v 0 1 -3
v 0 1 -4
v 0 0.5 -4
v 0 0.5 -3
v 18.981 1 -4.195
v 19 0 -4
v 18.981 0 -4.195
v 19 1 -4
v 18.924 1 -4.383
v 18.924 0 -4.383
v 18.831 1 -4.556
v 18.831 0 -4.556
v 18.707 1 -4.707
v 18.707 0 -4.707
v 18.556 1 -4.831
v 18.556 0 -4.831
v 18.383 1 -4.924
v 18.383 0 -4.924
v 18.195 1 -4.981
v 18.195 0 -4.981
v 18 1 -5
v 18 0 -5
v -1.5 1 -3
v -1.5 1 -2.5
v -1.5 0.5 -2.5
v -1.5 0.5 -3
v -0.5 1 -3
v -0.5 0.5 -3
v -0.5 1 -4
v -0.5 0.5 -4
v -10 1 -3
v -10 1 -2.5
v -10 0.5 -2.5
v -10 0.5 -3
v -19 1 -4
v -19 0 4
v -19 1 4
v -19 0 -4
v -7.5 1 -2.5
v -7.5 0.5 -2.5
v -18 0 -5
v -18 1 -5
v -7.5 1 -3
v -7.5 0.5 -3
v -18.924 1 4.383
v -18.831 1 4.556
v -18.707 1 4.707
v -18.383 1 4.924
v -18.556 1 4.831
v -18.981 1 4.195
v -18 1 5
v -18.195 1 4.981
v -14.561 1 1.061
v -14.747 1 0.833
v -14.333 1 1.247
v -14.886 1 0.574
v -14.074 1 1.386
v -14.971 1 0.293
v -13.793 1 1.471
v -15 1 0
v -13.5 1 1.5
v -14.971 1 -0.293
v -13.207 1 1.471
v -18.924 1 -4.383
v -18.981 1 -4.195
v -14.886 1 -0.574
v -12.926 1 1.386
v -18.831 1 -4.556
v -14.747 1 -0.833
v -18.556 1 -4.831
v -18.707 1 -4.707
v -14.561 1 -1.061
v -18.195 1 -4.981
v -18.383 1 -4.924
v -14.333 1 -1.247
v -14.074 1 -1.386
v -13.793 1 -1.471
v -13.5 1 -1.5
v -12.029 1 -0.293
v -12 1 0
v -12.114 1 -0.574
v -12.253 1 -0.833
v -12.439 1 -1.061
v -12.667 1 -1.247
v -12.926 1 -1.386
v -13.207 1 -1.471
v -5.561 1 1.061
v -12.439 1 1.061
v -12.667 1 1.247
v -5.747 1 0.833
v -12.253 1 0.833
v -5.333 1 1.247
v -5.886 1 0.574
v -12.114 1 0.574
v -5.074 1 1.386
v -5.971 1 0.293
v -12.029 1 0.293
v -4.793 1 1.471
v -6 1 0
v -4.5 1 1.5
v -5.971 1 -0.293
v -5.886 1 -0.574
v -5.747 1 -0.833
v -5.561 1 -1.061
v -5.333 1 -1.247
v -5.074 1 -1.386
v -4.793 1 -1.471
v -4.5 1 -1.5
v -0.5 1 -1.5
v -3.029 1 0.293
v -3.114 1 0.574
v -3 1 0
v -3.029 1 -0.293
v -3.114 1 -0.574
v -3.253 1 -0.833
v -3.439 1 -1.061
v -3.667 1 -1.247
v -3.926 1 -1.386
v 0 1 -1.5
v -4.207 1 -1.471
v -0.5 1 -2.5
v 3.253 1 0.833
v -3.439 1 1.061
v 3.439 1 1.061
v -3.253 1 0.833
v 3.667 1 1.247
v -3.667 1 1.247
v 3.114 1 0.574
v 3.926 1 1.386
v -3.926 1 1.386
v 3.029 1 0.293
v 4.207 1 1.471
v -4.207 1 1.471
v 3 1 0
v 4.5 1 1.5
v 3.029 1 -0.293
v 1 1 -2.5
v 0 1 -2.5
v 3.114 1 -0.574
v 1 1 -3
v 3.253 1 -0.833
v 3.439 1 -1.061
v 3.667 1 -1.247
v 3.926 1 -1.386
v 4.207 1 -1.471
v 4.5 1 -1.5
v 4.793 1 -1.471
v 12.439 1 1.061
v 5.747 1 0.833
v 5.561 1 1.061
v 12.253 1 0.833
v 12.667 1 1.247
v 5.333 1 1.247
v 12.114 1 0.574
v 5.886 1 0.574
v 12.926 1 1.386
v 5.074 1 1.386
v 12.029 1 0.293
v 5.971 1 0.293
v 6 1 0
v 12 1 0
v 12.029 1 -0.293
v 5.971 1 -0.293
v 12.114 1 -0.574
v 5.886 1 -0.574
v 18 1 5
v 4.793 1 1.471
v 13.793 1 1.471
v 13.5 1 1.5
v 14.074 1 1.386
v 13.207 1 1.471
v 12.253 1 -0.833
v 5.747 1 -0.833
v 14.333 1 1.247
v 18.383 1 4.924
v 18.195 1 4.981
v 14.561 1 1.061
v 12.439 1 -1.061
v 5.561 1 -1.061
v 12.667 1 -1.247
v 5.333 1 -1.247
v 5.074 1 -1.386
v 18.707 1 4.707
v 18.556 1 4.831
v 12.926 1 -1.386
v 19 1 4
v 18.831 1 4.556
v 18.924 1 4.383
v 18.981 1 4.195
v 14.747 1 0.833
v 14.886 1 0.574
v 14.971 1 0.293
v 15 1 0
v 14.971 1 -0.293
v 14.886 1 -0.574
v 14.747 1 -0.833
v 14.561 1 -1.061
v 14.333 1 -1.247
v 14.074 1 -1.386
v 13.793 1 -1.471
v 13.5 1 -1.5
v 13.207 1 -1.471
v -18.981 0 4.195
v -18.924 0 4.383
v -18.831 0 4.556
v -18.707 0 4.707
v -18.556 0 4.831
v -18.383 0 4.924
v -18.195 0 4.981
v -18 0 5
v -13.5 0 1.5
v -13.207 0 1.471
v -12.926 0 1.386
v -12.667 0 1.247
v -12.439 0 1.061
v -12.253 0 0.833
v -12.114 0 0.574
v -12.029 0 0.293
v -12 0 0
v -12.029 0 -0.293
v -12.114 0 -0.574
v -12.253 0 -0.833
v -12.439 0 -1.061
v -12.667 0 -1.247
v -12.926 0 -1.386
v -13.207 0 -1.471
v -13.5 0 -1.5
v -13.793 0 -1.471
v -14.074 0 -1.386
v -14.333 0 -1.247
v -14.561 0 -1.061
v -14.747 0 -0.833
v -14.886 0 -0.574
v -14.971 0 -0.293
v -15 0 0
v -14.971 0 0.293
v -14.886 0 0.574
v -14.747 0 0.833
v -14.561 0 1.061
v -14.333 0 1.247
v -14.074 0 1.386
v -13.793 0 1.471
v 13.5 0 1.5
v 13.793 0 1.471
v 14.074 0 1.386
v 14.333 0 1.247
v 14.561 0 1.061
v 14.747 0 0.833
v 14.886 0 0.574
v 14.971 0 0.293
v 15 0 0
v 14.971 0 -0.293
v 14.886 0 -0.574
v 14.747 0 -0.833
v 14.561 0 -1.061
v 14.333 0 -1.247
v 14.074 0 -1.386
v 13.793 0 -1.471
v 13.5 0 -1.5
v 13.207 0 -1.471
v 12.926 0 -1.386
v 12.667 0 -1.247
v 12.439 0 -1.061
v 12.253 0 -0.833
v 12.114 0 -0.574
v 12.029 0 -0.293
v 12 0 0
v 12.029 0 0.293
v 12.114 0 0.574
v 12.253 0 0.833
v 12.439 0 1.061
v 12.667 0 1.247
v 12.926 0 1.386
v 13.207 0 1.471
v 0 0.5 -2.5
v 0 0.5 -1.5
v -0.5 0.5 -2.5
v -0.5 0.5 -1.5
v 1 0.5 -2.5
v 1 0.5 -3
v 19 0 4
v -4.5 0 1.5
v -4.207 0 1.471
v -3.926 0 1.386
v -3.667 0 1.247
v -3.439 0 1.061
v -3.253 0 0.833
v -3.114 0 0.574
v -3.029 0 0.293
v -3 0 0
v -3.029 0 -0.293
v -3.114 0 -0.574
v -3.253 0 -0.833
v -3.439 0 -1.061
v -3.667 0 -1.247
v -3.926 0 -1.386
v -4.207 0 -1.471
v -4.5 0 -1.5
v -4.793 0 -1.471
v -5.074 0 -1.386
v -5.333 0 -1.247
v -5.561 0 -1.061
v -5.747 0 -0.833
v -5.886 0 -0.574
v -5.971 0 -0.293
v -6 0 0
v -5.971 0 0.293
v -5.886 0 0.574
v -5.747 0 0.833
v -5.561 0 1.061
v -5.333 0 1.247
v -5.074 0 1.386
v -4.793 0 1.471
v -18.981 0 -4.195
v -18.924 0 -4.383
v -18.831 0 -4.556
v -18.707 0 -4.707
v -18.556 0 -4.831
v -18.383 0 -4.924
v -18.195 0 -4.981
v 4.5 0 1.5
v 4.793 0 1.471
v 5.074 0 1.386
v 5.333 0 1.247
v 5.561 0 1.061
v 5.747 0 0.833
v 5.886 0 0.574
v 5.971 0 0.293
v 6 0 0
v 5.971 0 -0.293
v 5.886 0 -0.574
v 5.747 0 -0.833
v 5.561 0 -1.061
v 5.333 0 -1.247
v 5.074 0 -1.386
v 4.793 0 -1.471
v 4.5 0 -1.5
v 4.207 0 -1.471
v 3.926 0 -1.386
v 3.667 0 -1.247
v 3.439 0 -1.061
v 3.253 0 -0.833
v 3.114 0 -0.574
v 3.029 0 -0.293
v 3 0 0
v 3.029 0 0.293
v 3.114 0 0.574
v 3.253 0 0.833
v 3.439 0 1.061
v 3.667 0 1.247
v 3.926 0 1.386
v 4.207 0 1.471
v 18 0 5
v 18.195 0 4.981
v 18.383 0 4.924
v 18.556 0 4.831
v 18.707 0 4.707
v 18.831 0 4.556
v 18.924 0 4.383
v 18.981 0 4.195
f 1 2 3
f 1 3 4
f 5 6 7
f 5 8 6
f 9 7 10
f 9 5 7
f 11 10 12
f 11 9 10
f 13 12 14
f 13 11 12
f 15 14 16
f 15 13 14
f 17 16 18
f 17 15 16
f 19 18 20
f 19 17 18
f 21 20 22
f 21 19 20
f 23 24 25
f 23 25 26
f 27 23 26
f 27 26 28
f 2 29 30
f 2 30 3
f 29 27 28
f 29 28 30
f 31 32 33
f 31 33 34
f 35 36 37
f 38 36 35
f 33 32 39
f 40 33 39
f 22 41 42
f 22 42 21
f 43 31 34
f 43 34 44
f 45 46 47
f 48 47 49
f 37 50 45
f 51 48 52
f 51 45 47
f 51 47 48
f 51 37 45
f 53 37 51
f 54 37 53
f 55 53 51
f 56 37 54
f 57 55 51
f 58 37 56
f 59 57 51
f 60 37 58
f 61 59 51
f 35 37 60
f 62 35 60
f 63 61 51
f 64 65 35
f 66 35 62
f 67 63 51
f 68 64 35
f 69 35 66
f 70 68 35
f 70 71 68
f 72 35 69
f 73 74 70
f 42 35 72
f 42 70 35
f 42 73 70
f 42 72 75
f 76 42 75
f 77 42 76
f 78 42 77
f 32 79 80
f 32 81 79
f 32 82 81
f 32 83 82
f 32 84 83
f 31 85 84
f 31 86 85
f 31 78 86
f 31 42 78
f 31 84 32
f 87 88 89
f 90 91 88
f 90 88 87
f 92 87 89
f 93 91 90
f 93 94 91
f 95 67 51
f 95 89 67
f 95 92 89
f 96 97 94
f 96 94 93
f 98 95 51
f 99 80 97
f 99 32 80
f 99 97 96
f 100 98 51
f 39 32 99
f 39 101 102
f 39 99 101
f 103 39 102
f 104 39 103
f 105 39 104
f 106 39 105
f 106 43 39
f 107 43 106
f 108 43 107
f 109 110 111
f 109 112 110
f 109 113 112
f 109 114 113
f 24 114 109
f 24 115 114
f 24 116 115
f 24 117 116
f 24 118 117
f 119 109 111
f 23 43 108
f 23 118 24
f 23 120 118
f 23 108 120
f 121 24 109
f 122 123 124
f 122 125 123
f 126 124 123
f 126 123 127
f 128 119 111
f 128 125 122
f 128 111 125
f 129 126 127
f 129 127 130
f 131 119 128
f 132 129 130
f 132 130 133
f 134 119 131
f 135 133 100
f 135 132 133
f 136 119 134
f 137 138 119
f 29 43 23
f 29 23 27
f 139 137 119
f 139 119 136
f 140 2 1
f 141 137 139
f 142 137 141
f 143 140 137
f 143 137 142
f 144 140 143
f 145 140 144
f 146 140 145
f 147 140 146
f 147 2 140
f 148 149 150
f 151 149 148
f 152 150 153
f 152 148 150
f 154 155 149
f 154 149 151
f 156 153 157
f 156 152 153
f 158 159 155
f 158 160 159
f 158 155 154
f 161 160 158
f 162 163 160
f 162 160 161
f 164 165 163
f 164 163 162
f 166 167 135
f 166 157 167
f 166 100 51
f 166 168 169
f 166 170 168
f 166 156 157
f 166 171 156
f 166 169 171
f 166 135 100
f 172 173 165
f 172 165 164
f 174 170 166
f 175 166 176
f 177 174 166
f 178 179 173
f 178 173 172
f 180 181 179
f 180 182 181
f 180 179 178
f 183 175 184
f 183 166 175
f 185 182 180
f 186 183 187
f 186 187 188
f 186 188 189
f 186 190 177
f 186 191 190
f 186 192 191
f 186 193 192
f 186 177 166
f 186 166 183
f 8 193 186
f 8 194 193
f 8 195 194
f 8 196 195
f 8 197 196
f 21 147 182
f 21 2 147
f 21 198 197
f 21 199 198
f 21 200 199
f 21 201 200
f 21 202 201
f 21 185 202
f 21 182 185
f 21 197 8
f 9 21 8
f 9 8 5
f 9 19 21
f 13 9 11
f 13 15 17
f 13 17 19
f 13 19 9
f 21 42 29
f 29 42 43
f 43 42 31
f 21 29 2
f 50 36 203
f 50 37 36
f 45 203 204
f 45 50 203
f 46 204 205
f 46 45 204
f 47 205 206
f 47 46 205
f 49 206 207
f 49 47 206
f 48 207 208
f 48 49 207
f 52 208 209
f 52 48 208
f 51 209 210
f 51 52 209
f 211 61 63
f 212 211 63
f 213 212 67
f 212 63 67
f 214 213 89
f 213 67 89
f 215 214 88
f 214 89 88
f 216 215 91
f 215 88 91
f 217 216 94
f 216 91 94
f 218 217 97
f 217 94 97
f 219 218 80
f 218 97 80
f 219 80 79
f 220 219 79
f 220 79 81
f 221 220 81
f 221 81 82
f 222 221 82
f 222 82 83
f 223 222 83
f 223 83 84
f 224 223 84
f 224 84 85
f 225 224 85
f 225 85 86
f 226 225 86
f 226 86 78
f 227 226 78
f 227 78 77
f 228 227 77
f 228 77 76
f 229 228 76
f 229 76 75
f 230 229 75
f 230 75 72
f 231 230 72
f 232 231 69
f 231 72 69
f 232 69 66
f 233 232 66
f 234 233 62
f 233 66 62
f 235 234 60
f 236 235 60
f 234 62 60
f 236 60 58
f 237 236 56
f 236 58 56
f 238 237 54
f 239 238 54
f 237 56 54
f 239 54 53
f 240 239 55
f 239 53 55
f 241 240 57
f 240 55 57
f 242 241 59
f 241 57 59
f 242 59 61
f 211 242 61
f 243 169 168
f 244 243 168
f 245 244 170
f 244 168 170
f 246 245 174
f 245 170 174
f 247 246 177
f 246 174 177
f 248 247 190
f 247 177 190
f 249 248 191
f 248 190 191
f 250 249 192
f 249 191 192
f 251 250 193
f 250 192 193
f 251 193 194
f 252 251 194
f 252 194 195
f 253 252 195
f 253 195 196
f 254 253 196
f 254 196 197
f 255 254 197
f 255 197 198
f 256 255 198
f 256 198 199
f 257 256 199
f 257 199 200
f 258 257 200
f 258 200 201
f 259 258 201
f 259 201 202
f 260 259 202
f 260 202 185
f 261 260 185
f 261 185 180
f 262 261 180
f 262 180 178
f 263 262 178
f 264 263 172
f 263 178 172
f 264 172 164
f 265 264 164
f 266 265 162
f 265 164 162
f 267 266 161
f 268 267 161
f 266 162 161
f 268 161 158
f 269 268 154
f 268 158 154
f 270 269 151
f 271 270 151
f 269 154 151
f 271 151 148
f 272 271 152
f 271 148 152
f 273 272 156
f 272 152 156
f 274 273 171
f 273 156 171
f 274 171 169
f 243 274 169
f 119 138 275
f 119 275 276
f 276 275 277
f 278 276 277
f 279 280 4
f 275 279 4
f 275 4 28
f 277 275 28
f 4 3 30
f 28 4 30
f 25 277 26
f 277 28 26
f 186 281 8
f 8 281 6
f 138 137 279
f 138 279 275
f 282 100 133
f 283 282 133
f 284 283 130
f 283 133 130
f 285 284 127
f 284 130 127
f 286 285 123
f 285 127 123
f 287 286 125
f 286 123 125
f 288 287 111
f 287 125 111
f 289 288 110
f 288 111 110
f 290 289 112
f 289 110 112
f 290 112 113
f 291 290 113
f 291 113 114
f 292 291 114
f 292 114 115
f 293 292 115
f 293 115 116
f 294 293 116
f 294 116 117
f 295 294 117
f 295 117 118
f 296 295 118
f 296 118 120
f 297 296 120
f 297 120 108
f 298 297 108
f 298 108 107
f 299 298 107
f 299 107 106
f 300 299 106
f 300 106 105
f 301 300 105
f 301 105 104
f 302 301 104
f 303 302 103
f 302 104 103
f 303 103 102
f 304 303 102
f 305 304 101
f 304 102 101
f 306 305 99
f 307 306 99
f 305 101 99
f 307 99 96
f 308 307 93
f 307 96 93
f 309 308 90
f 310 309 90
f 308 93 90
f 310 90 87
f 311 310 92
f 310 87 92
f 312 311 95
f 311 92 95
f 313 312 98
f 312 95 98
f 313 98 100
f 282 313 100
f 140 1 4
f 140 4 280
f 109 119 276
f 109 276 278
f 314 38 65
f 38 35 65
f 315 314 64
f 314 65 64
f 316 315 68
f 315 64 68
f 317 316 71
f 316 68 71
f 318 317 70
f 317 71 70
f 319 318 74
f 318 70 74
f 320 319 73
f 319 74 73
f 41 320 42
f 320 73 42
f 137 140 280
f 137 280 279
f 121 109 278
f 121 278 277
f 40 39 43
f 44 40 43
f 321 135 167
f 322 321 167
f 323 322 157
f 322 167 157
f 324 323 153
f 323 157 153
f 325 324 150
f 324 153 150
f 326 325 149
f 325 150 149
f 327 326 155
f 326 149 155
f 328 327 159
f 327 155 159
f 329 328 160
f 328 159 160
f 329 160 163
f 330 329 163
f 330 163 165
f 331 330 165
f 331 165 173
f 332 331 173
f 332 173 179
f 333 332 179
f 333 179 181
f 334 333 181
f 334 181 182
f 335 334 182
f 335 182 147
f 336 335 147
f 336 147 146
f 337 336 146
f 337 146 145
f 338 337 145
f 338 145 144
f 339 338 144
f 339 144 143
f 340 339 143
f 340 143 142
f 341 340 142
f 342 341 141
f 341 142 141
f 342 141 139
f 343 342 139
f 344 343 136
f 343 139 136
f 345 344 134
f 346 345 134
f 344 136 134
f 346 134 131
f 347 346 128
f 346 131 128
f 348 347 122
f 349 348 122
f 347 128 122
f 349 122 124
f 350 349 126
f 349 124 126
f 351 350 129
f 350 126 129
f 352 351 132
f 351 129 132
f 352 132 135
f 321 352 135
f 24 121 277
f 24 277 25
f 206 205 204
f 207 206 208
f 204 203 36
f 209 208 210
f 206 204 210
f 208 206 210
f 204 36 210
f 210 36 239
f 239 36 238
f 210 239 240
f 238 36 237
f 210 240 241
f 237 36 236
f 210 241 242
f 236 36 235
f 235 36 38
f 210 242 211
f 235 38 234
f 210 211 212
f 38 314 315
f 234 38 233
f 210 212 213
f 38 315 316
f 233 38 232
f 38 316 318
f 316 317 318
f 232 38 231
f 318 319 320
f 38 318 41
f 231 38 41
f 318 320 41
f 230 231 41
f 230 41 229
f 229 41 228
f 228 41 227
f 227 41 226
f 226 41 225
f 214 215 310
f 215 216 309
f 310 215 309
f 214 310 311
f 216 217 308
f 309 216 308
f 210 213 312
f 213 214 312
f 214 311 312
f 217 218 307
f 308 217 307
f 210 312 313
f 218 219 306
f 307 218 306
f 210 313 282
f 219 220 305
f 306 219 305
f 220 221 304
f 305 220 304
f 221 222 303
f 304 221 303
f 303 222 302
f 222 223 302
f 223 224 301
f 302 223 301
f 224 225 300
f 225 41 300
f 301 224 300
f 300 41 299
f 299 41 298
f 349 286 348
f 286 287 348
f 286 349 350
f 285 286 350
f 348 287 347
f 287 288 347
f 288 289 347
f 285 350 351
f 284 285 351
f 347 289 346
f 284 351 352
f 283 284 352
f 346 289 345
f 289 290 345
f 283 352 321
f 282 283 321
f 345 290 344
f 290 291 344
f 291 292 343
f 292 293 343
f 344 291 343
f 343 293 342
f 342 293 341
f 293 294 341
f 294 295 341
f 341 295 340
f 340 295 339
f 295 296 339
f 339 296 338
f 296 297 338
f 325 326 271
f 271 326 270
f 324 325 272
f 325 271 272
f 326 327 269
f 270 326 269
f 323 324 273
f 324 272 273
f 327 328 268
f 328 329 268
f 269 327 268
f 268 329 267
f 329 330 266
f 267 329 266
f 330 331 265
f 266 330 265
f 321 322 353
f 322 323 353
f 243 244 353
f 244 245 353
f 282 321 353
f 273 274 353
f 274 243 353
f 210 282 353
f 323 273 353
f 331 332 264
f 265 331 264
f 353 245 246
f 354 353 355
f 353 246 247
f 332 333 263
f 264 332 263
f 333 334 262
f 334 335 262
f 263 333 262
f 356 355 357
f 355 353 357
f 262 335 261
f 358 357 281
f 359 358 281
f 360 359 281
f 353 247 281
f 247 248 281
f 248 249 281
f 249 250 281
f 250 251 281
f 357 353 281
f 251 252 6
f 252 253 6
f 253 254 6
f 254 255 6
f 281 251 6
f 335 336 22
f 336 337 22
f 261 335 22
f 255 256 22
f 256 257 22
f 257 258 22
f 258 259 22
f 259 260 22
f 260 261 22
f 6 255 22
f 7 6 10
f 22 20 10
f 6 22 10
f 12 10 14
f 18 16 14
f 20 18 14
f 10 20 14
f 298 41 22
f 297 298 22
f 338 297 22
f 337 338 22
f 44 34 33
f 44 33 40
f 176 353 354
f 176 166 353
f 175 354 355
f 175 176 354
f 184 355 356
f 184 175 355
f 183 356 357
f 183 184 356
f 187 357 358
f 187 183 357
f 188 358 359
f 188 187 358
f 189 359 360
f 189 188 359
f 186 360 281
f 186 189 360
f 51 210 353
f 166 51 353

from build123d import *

# Parameters (mm, degrees)
SKETCH_1_W          = 38
SKETCH_1_H          = 10
EXTRUDE_1_DEPTH     = 1
FILLET_1_R          = 1
SKETCH_2_R          = 1.5
CUT_EXTRUDE_1_DEPTH = 20.672315573
SKETCH_3_W          = 2.5
SKETCH_3_H          = 0.5
CUT_EXTRUDE_2_DEPTH = 0.5


with BuildPart() as part:
    # Эскиз1 → Бобышка-Вытянуть1 (new body)
    with BuildSketch(Plane(origin=(0, 0, 0), x_dir=(1, 0, 0), z_dir=(0, 1, 0))):
        Rectangle(SKETCH_1_W, SKETCH_1_H)
    extrude(amount=EXTRUDE_1_DEPTH)

    # Скругление1
    fillet_1_edges = [part.edges().sort_by_distance(p)[0] for p in [
        (19, 0.5, 5),
        (-19, 0.5, 5),
        (-19, 0.5, -5),
        (19, 0.5, -5),
    ]]
    fillet(fillet_1_edges, radius=FILLET_1_R)

    # Эскиз2 → Вырез-Вытянуть1 (cut, through all)
    with BuildSketch(Plane(origin=(0, 1, 0), x_dir=(1, 0, 0), z_dir=(0, 1, 0))):
        with Locations(Location((-13.5, 0, 0), (0, 0, 270))):
            Circle(SKETCH_2_R)
        with Locations(Location((-4.5, 0, 0), (0, 0, 270))):
            Circle(SKETCH_2_R)
        with Locations(Location((4.5, 0, 0), (0, 0, 270))):
            Circle(SKETCH_2_R)
        with Locations(Location((13.5, 0, 0), (0, 0, 270))):
            Circle(SKETCH_2_R)
    extrude(amount=-CUT_EXTRUDE_1_DEPTH, mode=Mode.SUBTRACT)

    # Эскиз3 → Вырез-Вытянуть2 (cut)
    with BuildSketch(Plane(origin=(0, 1, 0), x_dir=(1, 0, 0), z_dir=(0, 1, 0))):
        Polygon((0, 2.5), (0, 1.5), (-0.5, 1.5), (-0.5, 2.5), (-1.5, 2.5), (-1.5, 3), (-0.5, 3), (-0.5, 4), (0, 4), (0, 3), (1, 3), (1, 2.5), align=None)
        with Locations((-8.75, 2.75)):
            Rectangle(SKETCH_3_W, SKETCH_3_H)
    extrude(amount=-CUT_EXTRUDE_2_DEPTH, mode=Mode.SUBTRACT)


solid = part.part
